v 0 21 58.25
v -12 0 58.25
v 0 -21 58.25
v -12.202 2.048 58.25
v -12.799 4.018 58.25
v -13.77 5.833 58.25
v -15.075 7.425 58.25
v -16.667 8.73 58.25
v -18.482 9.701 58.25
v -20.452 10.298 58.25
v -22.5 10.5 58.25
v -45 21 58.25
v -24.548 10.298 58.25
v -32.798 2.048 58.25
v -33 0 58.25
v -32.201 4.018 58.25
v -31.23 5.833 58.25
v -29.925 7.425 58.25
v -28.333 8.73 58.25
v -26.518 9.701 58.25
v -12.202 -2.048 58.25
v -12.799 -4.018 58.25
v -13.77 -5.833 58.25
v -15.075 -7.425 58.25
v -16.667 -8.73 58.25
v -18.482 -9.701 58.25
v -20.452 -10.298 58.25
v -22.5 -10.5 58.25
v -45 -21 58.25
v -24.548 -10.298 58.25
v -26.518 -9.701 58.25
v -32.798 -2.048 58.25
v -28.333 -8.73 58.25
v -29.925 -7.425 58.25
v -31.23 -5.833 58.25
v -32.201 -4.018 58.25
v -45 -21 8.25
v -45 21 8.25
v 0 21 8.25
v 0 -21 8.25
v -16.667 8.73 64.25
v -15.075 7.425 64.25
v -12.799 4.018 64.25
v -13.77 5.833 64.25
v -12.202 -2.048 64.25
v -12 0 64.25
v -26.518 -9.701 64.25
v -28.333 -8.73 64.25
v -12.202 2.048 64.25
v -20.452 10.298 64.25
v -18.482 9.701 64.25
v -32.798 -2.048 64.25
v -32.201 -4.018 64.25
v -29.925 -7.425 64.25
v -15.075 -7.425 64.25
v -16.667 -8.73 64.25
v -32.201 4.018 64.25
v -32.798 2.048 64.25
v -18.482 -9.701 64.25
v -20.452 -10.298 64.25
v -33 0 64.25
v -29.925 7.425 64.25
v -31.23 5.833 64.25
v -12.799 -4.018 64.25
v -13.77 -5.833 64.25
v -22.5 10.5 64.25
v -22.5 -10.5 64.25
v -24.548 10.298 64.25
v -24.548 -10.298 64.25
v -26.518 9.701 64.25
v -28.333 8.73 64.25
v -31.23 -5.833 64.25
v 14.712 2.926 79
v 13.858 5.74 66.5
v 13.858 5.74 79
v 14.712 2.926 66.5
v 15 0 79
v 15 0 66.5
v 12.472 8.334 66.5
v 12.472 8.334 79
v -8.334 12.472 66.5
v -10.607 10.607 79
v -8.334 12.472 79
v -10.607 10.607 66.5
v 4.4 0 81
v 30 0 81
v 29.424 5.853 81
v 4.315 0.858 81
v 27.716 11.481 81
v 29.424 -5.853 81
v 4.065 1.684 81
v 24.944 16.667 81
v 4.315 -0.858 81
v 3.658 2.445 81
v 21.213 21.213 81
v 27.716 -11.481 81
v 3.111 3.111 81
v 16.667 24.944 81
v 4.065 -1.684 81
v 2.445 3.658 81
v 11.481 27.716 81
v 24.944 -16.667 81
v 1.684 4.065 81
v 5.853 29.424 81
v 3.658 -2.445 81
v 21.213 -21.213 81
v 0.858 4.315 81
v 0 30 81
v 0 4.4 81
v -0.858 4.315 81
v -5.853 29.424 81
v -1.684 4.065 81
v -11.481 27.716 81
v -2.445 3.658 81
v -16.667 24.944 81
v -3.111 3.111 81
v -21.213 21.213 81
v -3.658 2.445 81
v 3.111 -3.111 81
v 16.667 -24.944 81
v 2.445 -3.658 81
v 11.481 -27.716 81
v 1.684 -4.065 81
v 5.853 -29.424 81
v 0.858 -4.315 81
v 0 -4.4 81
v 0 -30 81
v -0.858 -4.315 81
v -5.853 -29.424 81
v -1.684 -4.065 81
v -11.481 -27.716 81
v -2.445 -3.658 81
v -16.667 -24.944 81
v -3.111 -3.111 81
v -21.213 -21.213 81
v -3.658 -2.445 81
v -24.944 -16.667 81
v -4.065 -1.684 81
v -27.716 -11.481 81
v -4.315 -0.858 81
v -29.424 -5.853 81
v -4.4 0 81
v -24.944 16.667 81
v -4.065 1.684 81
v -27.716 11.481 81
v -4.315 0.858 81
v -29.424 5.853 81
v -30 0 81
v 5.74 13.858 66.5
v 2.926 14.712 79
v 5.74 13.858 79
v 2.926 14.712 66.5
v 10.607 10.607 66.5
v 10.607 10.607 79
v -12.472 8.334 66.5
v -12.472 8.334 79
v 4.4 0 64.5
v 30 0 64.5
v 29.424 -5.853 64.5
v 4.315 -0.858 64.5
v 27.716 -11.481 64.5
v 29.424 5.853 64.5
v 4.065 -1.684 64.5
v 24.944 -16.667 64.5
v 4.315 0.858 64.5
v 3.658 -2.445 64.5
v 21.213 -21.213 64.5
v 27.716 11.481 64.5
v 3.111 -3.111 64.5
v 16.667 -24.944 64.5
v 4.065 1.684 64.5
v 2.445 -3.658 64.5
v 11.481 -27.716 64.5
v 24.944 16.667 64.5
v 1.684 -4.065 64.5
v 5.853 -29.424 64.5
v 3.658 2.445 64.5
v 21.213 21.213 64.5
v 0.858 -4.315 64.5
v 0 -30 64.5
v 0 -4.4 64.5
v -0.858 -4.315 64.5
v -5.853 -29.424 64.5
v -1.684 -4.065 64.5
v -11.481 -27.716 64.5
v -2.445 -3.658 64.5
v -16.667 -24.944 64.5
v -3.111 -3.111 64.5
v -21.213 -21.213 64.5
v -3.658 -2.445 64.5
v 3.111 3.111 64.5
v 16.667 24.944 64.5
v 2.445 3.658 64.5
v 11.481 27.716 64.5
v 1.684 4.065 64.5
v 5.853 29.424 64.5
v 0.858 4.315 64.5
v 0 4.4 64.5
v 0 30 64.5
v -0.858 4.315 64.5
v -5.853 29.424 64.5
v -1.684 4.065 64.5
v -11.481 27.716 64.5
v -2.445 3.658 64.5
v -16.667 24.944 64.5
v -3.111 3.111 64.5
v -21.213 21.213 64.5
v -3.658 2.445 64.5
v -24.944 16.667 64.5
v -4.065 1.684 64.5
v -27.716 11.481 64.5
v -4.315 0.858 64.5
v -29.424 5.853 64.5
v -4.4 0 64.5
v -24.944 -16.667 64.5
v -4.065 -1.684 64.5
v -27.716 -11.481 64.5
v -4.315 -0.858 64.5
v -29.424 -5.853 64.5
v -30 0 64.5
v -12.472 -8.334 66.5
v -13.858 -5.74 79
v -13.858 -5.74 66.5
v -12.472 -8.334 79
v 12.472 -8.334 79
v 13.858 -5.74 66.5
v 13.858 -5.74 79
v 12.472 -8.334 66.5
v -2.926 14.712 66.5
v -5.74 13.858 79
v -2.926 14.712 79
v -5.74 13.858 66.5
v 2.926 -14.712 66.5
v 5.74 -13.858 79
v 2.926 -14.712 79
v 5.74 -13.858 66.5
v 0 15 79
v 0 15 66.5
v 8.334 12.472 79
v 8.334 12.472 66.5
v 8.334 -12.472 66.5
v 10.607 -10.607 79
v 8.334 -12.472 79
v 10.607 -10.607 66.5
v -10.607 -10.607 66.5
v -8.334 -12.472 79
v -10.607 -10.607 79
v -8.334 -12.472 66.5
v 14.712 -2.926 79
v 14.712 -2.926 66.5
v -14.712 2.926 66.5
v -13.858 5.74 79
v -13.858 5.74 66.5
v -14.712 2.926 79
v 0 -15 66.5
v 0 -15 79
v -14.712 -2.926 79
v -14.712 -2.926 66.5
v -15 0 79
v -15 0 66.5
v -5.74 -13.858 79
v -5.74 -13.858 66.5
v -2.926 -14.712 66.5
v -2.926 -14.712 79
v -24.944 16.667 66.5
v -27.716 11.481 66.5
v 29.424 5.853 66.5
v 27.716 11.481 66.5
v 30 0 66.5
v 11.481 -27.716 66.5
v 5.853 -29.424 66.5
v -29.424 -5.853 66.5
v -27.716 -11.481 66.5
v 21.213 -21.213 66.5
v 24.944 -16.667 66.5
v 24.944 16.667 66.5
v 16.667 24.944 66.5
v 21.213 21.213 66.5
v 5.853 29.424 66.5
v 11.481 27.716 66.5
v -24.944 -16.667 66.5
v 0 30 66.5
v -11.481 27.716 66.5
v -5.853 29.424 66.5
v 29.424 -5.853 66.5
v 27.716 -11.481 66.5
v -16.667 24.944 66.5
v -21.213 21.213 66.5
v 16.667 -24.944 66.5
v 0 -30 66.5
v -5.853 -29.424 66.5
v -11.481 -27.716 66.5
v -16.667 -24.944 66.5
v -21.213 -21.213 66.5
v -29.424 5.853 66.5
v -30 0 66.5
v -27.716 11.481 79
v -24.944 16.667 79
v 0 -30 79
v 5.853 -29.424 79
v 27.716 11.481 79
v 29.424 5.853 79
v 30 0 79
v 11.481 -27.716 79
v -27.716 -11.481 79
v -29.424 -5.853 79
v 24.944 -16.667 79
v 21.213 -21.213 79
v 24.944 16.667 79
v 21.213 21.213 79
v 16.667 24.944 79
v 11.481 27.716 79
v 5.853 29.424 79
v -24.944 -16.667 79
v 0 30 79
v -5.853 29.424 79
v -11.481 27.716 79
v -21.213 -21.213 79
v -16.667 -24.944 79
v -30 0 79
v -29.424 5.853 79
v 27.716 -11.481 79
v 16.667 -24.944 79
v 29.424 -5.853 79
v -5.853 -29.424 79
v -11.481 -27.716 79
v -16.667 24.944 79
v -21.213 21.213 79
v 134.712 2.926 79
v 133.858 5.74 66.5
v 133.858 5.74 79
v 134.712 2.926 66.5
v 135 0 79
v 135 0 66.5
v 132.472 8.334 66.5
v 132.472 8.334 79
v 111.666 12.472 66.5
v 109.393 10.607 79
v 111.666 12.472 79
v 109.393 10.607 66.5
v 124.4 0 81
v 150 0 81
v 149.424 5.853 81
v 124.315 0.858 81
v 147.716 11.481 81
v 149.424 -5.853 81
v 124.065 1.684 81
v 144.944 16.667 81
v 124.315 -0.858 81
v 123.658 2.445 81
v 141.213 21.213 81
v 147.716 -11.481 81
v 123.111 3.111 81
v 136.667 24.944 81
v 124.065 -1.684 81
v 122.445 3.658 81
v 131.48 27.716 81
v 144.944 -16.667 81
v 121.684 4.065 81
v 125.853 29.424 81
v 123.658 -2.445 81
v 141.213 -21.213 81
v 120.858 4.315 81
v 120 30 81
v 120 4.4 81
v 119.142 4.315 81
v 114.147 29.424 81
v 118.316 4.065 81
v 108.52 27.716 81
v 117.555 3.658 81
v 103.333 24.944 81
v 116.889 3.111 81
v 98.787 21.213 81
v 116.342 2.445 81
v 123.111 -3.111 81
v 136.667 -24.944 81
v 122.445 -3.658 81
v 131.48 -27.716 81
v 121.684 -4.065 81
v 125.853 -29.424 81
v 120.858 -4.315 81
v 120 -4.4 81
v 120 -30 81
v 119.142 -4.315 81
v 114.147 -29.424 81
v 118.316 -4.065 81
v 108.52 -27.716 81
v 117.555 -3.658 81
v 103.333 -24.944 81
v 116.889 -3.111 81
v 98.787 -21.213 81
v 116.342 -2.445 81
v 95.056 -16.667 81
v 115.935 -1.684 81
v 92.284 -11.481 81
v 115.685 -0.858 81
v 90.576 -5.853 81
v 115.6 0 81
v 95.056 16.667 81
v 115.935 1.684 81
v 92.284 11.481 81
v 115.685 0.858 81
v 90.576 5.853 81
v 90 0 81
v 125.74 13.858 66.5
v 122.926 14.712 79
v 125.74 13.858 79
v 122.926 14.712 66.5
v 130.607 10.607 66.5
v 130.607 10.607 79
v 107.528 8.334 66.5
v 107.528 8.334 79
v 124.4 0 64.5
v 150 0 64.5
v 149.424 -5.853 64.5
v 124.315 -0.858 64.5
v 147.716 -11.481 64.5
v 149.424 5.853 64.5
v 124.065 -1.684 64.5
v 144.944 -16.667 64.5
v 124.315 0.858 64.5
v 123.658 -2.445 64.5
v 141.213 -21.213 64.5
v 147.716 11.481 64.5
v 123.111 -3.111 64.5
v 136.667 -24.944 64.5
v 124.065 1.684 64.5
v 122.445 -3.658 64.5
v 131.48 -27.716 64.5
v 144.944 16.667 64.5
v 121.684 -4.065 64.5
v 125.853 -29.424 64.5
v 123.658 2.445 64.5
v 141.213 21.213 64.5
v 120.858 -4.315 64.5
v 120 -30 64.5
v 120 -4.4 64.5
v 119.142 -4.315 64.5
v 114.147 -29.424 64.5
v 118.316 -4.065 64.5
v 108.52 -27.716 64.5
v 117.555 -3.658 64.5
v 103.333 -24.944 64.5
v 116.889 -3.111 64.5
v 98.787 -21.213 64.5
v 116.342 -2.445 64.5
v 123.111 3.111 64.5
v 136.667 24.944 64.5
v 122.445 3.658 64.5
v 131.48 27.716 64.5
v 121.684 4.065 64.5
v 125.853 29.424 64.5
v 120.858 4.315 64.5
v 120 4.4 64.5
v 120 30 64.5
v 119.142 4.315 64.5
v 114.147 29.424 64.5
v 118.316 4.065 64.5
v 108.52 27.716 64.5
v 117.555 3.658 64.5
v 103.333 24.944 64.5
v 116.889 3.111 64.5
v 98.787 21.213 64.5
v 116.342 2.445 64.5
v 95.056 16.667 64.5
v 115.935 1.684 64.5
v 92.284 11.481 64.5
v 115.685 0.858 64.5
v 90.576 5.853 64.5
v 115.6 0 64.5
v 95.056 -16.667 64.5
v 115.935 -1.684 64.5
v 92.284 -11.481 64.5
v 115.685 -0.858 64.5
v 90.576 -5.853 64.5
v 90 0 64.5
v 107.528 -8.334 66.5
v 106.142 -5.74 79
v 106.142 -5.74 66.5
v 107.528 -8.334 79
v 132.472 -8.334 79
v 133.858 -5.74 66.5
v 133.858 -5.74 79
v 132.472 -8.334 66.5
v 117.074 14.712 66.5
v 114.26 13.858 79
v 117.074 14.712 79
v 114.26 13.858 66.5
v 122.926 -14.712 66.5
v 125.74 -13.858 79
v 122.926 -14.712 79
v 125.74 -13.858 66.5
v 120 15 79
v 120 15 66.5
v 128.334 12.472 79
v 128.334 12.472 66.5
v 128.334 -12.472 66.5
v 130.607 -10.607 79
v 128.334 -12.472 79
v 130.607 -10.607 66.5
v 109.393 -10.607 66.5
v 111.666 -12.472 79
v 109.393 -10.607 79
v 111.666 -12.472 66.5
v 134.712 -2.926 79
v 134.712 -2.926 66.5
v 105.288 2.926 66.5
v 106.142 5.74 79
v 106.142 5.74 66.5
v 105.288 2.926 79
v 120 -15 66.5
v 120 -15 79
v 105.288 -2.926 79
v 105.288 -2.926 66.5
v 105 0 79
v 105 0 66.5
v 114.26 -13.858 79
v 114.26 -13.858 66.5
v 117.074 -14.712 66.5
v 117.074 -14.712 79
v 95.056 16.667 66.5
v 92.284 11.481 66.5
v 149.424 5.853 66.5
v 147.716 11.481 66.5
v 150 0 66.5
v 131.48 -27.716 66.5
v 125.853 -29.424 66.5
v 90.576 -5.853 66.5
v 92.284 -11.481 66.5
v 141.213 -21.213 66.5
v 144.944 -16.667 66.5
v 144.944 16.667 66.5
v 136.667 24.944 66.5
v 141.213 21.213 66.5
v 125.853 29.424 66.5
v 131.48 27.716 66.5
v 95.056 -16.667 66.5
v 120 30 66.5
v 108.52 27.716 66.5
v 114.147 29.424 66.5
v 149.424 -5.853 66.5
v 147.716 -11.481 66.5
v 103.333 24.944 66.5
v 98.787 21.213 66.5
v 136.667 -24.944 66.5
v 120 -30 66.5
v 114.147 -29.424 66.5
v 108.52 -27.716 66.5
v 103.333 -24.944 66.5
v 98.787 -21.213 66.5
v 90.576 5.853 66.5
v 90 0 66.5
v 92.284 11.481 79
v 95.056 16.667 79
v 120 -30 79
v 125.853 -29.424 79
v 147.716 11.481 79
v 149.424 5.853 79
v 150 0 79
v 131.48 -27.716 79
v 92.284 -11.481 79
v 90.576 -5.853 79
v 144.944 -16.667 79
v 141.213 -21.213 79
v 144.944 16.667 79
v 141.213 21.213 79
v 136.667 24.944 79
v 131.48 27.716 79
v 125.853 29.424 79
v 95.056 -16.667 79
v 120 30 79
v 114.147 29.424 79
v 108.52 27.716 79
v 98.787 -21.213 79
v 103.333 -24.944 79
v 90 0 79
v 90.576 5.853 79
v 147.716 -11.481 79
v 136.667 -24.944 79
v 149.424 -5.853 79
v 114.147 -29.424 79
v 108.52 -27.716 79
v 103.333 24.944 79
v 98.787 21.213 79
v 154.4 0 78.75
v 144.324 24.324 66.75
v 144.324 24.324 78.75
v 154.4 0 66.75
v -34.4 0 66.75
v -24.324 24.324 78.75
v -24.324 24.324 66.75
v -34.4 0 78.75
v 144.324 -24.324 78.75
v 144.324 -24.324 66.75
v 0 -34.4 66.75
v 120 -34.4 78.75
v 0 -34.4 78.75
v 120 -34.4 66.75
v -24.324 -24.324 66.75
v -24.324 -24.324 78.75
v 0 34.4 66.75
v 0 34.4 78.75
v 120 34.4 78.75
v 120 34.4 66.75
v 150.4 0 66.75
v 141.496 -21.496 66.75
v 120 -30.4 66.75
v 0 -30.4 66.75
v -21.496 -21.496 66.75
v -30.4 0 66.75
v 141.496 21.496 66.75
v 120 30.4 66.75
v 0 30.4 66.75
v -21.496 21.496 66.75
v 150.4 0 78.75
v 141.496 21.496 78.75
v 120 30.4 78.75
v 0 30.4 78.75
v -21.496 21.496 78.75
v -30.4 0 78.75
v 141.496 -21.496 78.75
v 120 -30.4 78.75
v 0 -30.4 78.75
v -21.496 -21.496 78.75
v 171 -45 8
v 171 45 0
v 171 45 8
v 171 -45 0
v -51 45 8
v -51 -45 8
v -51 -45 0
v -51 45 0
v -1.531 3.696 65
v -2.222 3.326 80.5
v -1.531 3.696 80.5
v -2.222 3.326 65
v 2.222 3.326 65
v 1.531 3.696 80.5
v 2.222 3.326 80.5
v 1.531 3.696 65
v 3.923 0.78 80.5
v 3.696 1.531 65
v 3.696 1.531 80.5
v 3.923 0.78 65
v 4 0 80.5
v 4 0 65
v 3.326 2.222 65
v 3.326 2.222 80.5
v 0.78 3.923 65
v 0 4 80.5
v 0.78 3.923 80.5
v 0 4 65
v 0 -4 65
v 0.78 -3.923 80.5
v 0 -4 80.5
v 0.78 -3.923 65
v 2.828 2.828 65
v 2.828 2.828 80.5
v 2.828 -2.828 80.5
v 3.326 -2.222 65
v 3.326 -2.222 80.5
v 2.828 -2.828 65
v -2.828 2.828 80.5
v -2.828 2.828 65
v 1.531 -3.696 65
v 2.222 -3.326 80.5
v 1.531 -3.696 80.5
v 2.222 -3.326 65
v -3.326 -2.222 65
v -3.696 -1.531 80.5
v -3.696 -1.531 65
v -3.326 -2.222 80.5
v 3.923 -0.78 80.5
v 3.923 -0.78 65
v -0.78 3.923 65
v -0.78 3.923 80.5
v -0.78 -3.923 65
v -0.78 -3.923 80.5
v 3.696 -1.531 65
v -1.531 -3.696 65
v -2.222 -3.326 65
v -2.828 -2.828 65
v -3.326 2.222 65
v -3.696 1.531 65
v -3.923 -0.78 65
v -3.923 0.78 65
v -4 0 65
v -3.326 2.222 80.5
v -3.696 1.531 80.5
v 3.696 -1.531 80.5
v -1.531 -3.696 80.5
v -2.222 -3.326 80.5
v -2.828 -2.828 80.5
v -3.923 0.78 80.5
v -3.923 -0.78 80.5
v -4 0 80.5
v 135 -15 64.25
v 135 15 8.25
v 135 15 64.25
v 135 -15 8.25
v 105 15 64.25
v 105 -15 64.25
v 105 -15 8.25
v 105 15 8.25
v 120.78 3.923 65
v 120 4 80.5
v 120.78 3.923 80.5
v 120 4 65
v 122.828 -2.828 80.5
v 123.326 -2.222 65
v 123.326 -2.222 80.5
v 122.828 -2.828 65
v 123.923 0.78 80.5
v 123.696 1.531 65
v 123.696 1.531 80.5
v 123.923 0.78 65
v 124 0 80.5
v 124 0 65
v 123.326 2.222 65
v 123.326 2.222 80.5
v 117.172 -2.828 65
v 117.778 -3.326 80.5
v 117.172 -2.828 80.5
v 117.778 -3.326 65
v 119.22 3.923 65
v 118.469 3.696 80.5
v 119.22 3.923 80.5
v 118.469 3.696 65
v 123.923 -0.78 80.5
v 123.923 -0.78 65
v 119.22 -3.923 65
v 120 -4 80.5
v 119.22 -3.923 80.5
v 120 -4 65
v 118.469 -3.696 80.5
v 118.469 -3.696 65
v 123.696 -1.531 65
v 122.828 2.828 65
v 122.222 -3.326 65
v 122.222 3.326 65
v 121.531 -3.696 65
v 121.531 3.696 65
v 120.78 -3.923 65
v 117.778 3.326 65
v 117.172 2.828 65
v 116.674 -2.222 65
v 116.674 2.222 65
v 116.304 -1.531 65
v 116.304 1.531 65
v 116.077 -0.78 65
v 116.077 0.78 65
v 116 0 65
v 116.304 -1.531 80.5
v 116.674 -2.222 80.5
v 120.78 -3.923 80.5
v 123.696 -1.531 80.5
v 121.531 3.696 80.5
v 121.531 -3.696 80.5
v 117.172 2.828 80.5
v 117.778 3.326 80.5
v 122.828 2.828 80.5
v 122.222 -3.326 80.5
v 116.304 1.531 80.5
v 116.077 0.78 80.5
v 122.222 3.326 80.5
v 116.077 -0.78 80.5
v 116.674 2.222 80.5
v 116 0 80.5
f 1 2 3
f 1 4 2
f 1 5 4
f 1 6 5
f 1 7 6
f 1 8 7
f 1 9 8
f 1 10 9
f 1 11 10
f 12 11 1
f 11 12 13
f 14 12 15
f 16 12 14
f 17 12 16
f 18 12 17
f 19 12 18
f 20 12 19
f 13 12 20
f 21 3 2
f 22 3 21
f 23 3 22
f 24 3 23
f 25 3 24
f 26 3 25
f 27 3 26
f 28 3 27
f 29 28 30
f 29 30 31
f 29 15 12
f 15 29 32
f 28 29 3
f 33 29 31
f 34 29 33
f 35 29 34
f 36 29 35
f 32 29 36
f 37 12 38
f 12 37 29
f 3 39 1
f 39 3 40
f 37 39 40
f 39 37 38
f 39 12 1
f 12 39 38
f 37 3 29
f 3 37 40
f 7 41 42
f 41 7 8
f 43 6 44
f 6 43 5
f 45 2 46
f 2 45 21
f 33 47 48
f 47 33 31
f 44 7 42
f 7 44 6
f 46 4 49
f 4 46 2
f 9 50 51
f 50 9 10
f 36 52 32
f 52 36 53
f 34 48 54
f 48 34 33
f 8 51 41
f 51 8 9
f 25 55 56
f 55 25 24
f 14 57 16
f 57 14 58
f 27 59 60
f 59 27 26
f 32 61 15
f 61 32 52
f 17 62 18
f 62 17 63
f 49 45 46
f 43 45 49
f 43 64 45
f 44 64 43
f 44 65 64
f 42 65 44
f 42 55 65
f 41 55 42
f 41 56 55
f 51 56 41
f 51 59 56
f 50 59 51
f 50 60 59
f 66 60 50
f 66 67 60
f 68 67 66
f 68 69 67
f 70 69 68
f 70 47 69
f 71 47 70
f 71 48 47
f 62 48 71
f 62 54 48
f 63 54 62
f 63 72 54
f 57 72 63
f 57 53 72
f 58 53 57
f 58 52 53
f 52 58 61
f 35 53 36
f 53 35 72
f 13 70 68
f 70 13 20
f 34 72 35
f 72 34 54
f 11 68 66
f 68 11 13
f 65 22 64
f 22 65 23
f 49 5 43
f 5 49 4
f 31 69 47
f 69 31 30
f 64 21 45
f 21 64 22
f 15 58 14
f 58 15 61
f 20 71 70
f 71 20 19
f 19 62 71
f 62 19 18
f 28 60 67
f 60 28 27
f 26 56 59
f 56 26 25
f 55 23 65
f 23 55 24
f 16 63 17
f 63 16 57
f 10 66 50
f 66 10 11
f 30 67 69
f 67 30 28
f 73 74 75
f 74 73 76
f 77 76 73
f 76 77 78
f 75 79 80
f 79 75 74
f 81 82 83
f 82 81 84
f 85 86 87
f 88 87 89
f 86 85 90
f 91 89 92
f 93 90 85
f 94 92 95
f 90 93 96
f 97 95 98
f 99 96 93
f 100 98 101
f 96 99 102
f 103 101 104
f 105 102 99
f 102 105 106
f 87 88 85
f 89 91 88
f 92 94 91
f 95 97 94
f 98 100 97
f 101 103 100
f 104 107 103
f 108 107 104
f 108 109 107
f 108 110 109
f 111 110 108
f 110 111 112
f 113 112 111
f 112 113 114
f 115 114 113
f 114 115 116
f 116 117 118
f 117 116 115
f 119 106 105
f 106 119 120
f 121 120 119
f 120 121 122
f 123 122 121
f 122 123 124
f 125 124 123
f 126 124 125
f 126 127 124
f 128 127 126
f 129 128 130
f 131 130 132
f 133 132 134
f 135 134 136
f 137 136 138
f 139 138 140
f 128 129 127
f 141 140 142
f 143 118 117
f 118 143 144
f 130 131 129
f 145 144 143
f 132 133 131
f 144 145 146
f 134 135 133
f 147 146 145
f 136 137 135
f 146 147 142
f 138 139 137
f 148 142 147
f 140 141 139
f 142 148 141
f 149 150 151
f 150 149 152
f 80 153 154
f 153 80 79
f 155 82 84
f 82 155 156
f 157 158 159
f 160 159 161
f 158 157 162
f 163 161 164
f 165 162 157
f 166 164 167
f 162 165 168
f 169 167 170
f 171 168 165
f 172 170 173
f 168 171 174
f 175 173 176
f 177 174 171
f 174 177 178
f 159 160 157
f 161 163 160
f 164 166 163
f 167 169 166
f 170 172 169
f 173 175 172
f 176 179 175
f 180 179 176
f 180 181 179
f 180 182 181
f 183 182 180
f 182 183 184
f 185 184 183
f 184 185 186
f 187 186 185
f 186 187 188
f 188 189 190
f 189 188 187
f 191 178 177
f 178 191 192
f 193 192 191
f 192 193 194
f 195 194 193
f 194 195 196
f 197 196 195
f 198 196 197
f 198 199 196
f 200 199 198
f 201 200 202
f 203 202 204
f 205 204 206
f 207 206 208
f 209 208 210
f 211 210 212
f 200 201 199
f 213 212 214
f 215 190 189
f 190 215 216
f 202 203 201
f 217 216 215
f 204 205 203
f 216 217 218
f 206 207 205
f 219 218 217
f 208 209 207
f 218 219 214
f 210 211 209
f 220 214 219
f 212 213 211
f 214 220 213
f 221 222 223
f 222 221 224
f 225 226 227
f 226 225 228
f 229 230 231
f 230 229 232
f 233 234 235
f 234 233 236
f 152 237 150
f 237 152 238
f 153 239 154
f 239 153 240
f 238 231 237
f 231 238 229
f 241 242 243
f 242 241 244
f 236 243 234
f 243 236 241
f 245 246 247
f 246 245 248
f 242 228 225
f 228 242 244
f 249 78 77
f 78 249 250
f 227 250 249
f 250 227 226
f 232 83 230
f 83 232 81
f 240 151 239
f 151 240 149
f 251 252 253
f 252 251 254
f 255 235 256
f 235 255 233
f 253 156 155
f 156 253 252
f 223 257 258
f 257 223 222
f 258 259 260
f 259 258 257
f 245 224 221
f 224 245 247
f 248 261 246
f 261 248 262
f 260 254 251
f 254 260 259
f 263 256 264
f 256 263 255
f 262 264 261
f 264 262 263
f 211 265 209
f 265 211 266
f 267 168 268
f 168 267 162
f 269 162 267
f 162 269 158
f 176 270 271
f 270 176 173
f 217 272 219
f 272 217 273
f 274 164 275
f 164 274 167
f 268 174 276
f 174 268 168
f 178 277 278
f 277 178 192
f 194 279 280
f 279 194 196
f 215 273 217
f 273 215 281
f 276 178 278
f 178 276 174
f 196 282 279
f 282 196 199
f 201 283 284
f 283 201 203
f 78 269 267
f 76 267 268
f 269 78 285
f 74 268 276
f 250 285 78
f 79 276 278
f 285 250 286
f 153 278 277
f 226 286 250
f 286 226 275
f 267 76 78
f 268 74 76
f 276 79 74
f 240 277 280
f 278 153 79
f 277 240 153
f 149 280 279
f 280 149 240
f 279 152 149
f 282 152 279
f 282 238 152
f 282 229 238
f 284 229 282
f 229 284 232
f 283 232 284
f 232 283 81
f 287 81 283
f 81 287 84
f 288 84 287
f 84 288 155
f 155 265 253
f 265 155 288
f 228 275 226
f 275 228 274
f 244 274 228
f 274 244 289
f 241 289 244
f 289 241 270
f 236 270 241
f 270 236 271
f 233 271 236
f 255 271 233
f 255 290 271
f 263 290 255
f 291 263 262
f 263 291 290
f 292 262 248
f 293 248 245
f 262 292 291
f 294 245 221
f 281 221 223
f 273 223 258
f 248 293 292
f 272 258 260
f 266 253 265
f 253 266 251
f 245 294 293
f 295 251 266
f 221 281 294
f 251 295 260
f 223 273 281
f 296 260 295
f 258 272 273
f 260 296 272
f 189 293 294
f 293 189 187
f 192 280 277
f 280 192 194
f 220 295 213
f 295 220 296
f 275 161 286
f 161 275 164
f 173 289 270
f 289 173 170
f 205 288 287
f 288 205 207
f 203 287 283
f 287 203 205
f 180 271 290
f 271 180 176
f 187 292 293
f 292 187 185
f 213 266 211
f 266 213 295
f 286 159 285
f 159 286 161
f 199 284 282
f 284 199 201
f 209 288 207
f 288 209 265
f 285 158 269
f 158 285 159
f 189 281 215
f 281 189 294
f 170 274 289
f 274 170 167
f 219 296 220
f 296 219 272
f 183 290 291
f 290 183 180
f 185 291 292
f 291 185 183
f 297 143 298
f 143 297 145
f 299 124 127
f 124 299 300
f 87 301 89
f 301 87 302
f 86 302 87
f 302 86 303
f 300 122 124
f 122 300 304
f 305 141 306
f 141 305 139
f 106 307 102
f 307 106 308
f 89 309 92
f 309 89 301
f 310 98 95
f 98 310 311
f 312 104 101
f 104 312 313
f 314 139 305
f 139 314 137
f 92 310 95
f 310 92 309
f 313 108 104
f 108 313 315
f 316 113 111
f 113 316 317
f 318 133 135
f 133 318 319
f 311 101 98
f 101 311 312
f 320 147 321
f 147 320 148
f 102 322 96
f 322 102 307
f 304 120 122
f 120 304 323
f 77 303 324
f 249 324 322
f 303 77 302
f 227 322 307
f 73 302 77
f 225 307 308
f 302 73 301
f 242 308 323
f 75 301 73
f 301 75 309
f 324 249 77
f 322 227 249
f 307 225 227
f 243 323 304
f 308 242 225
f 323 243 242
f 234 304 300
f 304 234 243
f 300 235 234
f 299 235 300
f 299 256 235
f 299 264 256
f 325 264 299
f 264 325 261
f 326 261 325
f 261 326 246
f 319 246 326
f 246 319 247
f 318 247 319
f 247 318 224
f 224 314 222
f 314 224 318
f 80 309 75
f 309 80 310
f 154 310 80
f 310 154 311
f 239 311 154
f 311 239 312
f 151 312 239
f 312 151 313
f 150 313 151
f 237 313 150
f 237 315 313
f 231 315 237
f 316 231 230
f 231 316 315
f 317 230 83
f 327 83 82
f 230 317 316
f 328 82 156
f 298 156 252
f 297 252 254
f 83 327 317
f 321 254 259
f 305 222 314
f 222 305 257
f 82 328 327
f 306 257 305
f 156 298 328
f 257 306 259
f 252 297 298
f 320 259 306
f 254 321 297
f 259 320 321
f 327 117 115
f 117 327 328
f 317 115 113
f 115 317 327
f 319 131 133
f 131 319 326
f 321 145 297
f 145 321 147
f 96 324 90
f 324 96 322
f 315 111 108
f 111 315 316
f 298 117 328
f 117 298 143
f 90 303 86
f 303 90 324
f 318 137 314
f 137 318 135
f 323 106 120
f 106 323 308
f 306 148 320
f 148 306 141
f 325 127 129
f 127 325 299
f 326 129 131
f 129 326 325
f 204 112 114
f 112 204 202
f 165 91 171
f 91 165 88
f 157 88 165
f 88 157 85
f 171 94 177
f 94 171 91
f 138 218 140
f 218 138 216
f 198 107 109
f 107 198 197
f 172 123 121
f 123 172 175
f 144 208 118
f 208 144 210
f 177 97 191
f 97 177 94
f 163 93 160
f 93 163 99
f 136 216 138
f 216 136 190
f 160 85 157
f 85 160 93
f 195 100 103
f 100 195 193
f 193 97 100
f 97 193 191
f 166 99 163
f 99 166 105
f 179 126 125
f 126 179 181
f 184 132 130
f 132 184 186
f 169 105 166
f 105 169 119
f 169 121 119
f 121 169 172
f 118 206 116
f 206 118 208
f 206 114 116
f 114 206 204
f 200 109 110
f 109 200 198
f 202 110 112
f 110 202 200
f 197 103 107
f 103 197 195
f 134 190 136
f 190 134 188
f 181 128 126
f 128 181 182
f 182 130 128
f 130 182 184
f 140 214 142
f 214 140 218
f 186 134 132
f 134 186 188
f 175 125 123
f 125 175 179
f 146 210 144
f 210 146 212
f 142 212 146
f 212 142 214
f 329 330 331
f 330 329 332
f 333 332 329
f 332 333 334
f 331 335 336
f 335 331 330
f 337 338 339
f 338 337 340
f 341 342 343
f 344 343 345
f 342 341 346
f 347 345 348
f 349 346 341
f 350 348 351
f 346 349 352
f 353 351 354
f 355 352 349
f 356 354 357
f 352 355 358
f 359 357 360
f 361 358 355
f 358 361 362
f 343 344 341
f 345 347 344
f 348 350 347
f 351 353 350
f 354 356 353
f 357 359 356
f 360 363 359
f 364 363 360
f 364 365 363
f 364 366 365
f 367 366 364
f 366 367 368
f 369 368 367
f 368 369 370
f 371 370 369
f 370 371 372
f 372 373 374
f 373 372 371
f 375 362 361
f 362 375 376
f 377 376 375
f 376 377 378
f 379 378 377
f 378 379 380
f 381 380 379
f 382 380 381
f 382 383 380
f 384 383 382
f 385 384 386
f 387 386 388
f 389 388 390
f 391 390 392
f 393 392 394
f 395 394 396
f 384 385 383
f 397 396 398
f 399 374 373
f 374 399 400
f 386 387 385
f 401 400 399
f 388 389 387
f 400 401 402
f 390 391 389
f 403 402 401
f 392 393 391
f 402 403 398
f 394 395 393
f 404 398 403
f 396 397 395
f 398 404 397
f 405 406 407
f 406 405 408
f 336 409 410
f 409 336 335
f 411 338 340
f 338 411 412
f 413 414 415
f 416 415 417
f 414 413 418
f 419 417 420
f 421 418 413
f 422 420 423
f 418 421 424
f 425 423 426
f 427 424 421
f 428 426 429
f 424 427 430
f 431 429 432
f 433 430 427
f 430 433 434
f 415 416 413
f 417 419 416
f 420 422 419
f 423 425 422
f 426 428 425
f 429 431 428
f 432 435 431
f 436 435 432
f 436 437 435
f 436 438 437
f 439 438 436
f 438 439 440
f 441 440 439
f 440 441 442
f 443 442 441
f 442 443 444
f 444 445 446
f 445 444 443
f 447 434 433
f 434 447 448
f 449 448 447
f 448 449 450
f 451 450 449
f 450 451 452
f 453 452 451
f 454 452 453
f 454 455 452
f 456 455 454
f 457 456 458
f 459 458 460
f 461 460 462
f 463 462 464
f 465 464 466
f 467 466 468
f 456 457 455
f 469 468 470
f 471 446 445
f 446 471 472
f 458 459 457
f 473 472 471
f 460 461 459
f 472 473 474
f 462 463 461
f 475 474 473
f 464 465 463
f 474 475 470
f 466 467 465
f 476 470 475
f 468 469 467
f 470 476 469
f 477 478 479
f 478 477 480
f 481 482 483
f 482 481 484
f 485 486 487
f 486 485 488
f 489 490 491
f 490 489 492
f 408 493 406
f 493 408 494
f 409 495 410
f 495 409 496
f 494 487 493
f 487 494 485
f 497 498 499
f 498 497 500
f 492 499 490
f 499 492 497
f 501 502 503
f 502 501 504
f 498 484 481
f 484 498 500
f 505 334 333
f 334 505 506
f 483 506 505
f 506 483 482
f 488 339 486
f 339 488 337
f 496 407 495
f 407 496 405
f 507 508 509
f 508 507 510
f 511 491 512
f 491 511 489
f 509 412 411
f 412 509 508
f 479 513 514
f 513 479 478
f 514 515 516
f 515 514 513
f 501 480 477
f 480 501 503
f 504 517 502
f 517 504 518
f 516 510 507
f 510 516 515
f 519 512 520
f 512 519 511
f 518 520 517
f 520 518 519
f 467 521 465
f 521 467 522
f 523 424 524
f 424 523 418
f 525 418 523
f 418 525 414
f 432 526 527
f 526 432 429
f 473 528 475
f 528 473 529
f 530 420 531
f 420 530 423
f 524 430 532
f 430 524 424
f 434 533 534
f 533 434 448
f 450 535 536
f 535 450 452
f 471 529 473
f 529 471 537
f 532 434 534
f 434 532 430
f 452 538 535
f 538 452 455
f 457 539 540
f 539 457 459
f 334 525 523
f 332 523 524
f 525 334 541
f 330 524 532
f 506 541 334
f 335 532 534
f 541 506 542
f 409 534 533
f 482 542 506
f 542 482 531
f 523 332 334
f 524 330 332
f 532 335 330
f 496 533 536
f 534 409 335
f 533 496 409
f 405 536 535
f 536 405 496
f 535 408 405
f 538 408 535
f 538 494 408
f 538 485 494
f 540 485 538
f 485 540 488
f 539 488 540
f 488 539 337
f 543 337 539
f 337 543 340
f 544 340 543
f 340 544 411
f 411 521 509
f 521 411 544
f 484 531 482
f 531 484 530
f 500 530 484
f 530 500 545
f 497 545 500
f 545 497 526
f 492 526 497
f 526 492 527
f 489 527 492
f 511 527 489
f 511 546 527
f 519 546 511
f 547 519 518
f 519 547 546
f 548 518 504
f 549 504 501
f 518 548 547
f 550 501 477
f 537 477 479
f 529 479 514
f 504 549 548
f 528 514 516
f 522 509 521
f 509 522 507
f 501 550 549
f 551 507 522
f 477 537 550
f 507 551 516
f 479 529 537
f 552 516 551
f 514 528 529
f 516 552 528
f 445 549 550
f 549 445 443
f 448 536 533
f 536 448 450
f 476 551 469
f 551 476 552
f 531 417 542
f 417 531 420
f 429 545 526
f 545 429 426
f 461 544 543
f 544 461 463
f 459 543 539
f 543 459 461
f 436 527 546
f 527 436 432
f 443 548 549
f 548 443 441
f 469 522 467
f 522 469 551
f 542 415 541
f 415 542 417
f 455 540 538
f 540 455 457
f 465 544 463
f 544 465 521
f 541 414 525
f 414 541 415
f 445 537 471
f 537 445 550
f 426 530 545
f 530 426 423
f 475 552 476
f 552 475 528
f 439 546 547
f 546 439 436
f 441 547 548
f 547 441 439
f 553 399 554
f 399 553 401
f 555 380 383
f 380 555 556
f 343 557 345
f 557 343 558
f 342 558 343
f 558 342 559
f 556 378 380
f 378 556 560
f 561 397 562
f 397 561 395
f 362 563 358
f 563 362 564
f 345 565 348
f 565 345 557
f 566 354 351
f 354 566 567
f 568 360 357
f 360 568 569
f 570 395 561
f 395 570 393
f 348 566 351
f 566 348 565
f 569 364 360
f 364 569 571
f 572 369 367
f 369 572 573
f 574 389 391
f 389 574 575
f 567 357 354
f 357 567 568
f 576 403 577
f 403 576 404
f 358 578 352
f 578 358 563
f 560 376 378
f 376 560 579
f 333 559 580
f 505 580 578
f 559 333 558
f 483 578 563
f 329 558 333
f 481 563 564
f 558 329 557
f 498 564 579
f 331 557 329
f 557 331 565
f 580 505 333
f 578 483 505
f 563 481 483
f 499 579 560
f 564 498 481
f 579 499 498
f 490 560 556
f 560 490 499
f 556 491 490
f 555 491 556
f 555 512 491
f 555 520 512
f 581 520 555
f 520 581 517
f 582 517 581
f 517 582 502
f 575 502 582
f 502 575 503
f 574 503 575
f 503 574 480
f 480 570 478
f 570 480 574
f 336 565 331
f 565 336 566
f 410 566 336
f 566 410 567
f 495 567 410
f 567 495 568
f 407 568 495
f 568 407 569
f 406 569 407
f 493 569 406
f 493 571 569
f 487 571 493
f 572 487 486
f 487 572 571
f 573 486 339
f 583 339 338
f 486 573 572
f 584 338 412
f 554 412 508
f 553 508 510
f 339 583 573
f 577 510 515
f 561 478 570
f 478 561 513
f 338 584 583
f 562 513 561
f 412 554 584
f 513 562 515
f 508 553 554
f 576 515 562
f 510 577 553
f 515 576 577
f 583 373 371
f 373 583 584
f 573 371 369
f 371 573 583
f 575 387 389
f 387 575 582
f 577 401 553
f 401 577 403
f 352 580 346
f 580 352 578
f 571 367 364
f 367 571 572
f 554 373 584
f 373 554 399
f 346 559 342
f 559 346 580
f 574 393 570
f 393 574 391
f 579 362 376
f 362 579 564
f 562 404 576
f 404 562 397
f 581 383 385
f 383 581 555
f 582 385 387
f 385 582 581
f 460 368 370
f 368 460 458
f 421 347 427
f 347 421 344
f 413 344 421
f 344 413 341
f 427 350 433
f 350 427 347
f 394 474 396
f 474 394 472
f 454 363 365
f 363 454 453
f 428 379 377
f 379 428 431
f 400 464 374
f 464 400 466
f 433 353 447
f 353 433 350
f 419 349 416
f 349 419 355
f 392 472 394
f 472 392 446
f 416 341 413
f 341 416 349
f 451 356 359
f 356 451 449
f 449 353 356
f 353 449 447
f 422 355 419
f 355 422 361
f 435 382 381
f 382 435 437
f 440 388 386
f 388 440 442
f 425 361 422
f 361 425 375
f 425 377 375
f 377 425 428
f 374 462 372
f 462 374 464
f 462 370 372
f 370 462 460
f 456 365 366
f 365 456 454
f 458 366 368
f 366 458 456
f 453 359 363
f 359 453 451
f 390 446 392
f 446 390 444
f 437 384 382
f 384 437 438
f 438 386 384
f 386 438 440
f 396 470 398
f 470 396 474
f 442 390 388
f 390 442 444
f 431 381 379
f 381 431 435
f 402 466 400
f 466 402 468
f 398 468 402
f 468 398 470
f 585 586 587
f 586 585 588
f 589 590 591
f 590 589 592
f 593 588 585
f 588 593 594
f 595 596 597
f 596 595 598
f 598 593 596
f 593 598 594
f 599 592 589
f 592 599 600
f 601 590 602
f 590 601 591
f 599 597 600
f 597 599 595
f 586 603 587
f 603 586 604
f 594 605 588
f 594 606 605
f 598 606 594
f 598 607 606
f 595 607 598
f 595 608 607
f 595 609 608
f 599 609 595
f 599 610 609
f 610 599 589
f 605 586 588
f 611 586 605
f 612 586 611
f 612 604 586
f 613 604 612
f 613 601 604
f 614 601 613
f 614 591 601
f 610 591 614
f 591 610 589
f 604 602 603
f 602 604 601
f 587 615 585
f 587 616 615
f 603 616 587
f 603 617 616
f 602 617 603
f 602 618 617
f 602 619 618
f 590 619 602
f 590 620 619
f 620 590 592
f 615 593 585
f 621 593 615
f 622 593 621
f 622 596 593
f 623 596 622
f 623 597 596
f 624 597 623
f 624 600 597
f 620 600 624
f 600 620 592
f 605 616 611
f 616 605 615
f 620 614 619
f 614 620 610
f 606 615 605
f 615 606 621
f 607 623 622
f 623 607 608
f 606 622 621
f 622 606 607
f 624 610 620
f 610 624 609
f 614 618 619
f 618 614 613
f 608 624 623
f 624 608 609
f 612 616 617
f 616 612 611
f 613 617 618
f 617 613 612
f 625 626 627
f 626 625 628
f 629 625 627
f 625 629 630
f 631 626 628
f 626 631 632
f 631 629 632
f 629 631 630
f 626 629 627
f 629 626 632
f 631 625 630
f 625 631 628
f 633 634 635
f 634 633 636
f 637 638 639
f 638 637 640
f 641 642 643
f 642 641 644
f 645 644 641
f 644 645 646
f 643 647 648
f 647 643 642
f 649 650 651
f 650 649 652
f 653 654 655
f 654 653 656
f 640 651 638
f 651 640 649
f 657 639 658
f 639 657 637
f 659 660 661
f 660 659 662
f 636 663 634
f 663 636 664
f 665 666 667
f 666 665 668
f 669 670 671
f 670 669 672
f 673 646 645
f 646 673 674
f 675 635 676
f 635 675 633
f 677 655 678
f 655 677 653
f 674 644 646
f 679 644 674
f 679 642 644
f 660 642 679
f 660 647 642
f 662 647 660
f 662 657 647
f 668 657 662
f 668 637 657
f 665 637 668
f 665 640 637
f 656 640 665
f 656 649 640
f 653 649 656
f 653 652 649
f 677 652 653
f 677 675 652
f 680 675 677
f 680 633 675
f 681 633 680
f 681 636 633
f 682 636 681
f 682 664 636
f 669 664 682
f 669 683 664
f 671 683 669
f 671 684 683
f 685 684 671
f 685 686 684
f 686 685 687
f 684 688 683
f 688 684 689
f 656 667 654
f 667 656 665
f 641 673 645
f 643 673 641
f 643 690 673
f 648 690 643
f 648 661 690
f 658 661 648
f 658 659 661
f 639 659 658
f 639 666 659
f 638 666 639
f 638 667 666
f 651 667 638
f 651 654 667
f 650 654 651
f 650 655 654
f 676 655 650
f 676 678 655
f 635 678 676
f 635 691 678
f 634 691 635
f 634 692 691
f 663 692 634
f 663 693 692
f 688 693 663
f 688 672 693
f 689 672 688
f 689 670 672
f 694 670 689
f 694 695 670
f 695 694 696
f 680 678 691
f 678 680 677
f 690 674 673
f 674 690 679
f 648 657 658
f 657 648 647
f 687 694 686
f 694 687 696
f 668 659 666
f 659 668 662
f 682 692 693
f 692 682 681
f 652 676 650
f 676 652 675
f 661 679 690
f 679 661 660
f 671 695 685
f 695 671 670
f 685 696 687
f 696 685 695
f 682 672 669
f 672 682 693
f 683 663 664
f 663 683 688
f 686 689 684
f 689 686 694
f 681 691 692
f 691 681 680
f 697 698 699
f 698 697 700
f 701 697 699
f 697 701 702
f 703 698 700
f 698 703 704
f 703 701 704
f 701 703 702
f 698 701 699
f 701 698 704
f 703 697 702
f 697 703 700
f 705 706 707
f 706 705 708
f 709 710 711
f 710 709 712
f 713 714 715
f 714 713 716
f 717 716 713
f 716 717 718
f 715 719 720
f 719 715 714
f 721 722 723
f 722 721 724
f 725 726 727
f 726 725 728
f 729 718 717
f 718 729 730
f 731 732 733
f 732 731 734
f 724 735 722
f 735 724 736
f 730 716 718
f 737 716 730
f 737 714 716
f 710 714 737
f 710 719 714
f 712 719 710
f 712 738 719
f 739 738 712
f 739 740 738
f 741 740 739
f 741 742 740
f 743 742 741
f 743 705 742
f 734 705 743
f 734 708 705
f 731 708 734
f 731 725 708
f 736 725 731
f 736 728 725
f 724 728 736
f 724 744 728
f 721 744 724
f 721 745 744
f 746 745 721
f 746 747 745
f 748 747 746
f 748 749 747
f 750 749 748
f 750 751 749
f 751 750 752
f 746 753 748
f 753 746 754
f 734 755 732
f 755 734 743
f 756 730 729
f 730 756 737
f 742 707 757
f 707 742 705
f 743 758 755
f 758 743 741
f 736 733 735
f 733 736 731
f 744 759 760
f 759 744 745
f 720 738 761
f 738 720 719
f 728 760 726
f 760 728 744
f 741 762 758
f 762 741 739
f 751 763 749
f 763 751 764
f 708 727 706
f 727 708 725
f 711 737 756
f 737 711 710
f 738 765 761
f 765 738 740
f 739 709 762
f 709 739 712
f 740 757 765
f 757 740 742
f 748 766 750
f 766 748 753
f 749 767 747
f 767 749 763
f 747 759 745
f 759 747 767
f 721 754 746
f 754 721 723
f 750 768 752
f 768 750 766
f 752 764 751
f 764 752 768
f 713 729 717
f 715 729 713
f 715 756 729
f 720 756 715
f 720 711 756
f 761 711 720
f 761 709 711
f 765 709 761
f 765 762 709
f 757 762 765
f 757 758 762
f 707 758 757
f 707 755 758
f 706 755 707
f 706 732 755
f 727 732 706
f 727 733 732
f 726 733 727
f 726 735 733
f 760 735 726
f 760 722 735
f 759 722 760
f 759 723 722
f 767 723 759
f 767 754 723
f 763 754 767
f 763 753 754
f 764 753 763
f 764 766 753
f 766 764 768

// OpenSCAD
$fn = 32;

// ------------------------------------------------------------------------
// Motor belt drive: span 120 mm, pulleys d60, belt 12 mm wide
// Every part is its own module, assembly() places every instance.
// ------------------------------------------------------------------------

// --- part 1 ---
module base_plate() {
  difference() {
    translate([-111, -45, 0]) cube([222, 90, 8]);
  }
}

// --- part 2 ---
module motor() {
  union() {
    translate([-25, -21, 0]) cube([50, 42, 45]);
    translate([28, 0, 22.5]) rotate([0, 90, 0]) cylinder(h = 6, d = 21, center = true);
  }
}

// --- part 3 ---
module drive_shaft() {
  translate([0, 0, -7.75]) cylinder(h = 15.5, d = 8);
}

// --- part 4 ---
module pulley_drive() {
  difference() {
    union() {
      cylinder(h = 16.5, d = 30);
      cylinder(h = 2, d = 60);
      translate([0, 0, 14.5]) cylinder(h = 2, d = 60);
    }
    translate([0, 0, -1]) cylinder(h = 18.5, d = 8.8);
  }
}

// --- part 5 ---
module idler_post() {
  translate([-15, -15, 0]) cube([30, 30, 56]);
}

// --- part 6 ---
module driven_shaft() {
  translate([0, 0, -7.75]) cylinder(h = 15.5, d = 8);
}

// --- part 7 ---
module pulley_driven() {
  difference() {
    union() {
      cylinder(h = 16.5, d = 30);
      cylinder(h = 2, d = 60);
      translate([0, 0, 14.5]) cylinder(h = 2, d = 60);
    }
    translate([0, 0, -1]) cylinder(h = 18.5, d = 8.8);
  }
}

// --- part 8 ---
module drive_belt() {
  difference() {
    linear_extrude(height = 12) polygon(points = concat([for (a = [90 : 45 : 270]) [34.4 * cos(a), 34.4 * sin(a)]], [for (a = [270 : 45 : 450]) [120 + 34.4 * cos(a), 34.4 * sin(a)]]));
    translate([0, 0, -1]) linear_extrude(height = 14) polygon(points = concat([for (a = [90 : 45 : 270]) [30.4 * cos(a), 30.4 * sin(a)]], [for (a = [270 : 45 : 450]) [120 + 30.4 * cos(a), 30.4 * sin(a)]]));
  }
}

// --- assembly ---
module assembly() {
  color([0.80, 0.24, 0.20]) translate([60, 0, 0]) rotate([0, 0, 0]) base_plate();
  color([0.20, 0.45, 0.75]) translate([0, 0, 33.25]) rotate([0, 270, 0]) motor();
  color([0.25, 0.62, 0.32]) translate([0, 0, 72.75]) rotate([0, 0, 0]) drive_shaft();
  color([0.92, 0.70, 0.18]) translate([0, 0, 64.5]) rotate([0, 0, 0]) pulley_drive();
  color([0.58, 0.35, 0.70]) translate([120, 0, 8.25]) rotate([0, 0, 0]) idler_post();
  color([0.16, 0.66, 0.66]) translate([120, 0, 72.75]) rotate([0, 0, 0]) driven_shaft();
  color([0.85, 0.48, 0.18]) translate([120, 0, 64.5]) rotate([0, 0, 0]) pulley_driven();
  color([0.55, 0.60, 0.65]) translate([0, 0, 66.75]) rotate([0, 0, 0]) drive_belt();
}

assembly();
